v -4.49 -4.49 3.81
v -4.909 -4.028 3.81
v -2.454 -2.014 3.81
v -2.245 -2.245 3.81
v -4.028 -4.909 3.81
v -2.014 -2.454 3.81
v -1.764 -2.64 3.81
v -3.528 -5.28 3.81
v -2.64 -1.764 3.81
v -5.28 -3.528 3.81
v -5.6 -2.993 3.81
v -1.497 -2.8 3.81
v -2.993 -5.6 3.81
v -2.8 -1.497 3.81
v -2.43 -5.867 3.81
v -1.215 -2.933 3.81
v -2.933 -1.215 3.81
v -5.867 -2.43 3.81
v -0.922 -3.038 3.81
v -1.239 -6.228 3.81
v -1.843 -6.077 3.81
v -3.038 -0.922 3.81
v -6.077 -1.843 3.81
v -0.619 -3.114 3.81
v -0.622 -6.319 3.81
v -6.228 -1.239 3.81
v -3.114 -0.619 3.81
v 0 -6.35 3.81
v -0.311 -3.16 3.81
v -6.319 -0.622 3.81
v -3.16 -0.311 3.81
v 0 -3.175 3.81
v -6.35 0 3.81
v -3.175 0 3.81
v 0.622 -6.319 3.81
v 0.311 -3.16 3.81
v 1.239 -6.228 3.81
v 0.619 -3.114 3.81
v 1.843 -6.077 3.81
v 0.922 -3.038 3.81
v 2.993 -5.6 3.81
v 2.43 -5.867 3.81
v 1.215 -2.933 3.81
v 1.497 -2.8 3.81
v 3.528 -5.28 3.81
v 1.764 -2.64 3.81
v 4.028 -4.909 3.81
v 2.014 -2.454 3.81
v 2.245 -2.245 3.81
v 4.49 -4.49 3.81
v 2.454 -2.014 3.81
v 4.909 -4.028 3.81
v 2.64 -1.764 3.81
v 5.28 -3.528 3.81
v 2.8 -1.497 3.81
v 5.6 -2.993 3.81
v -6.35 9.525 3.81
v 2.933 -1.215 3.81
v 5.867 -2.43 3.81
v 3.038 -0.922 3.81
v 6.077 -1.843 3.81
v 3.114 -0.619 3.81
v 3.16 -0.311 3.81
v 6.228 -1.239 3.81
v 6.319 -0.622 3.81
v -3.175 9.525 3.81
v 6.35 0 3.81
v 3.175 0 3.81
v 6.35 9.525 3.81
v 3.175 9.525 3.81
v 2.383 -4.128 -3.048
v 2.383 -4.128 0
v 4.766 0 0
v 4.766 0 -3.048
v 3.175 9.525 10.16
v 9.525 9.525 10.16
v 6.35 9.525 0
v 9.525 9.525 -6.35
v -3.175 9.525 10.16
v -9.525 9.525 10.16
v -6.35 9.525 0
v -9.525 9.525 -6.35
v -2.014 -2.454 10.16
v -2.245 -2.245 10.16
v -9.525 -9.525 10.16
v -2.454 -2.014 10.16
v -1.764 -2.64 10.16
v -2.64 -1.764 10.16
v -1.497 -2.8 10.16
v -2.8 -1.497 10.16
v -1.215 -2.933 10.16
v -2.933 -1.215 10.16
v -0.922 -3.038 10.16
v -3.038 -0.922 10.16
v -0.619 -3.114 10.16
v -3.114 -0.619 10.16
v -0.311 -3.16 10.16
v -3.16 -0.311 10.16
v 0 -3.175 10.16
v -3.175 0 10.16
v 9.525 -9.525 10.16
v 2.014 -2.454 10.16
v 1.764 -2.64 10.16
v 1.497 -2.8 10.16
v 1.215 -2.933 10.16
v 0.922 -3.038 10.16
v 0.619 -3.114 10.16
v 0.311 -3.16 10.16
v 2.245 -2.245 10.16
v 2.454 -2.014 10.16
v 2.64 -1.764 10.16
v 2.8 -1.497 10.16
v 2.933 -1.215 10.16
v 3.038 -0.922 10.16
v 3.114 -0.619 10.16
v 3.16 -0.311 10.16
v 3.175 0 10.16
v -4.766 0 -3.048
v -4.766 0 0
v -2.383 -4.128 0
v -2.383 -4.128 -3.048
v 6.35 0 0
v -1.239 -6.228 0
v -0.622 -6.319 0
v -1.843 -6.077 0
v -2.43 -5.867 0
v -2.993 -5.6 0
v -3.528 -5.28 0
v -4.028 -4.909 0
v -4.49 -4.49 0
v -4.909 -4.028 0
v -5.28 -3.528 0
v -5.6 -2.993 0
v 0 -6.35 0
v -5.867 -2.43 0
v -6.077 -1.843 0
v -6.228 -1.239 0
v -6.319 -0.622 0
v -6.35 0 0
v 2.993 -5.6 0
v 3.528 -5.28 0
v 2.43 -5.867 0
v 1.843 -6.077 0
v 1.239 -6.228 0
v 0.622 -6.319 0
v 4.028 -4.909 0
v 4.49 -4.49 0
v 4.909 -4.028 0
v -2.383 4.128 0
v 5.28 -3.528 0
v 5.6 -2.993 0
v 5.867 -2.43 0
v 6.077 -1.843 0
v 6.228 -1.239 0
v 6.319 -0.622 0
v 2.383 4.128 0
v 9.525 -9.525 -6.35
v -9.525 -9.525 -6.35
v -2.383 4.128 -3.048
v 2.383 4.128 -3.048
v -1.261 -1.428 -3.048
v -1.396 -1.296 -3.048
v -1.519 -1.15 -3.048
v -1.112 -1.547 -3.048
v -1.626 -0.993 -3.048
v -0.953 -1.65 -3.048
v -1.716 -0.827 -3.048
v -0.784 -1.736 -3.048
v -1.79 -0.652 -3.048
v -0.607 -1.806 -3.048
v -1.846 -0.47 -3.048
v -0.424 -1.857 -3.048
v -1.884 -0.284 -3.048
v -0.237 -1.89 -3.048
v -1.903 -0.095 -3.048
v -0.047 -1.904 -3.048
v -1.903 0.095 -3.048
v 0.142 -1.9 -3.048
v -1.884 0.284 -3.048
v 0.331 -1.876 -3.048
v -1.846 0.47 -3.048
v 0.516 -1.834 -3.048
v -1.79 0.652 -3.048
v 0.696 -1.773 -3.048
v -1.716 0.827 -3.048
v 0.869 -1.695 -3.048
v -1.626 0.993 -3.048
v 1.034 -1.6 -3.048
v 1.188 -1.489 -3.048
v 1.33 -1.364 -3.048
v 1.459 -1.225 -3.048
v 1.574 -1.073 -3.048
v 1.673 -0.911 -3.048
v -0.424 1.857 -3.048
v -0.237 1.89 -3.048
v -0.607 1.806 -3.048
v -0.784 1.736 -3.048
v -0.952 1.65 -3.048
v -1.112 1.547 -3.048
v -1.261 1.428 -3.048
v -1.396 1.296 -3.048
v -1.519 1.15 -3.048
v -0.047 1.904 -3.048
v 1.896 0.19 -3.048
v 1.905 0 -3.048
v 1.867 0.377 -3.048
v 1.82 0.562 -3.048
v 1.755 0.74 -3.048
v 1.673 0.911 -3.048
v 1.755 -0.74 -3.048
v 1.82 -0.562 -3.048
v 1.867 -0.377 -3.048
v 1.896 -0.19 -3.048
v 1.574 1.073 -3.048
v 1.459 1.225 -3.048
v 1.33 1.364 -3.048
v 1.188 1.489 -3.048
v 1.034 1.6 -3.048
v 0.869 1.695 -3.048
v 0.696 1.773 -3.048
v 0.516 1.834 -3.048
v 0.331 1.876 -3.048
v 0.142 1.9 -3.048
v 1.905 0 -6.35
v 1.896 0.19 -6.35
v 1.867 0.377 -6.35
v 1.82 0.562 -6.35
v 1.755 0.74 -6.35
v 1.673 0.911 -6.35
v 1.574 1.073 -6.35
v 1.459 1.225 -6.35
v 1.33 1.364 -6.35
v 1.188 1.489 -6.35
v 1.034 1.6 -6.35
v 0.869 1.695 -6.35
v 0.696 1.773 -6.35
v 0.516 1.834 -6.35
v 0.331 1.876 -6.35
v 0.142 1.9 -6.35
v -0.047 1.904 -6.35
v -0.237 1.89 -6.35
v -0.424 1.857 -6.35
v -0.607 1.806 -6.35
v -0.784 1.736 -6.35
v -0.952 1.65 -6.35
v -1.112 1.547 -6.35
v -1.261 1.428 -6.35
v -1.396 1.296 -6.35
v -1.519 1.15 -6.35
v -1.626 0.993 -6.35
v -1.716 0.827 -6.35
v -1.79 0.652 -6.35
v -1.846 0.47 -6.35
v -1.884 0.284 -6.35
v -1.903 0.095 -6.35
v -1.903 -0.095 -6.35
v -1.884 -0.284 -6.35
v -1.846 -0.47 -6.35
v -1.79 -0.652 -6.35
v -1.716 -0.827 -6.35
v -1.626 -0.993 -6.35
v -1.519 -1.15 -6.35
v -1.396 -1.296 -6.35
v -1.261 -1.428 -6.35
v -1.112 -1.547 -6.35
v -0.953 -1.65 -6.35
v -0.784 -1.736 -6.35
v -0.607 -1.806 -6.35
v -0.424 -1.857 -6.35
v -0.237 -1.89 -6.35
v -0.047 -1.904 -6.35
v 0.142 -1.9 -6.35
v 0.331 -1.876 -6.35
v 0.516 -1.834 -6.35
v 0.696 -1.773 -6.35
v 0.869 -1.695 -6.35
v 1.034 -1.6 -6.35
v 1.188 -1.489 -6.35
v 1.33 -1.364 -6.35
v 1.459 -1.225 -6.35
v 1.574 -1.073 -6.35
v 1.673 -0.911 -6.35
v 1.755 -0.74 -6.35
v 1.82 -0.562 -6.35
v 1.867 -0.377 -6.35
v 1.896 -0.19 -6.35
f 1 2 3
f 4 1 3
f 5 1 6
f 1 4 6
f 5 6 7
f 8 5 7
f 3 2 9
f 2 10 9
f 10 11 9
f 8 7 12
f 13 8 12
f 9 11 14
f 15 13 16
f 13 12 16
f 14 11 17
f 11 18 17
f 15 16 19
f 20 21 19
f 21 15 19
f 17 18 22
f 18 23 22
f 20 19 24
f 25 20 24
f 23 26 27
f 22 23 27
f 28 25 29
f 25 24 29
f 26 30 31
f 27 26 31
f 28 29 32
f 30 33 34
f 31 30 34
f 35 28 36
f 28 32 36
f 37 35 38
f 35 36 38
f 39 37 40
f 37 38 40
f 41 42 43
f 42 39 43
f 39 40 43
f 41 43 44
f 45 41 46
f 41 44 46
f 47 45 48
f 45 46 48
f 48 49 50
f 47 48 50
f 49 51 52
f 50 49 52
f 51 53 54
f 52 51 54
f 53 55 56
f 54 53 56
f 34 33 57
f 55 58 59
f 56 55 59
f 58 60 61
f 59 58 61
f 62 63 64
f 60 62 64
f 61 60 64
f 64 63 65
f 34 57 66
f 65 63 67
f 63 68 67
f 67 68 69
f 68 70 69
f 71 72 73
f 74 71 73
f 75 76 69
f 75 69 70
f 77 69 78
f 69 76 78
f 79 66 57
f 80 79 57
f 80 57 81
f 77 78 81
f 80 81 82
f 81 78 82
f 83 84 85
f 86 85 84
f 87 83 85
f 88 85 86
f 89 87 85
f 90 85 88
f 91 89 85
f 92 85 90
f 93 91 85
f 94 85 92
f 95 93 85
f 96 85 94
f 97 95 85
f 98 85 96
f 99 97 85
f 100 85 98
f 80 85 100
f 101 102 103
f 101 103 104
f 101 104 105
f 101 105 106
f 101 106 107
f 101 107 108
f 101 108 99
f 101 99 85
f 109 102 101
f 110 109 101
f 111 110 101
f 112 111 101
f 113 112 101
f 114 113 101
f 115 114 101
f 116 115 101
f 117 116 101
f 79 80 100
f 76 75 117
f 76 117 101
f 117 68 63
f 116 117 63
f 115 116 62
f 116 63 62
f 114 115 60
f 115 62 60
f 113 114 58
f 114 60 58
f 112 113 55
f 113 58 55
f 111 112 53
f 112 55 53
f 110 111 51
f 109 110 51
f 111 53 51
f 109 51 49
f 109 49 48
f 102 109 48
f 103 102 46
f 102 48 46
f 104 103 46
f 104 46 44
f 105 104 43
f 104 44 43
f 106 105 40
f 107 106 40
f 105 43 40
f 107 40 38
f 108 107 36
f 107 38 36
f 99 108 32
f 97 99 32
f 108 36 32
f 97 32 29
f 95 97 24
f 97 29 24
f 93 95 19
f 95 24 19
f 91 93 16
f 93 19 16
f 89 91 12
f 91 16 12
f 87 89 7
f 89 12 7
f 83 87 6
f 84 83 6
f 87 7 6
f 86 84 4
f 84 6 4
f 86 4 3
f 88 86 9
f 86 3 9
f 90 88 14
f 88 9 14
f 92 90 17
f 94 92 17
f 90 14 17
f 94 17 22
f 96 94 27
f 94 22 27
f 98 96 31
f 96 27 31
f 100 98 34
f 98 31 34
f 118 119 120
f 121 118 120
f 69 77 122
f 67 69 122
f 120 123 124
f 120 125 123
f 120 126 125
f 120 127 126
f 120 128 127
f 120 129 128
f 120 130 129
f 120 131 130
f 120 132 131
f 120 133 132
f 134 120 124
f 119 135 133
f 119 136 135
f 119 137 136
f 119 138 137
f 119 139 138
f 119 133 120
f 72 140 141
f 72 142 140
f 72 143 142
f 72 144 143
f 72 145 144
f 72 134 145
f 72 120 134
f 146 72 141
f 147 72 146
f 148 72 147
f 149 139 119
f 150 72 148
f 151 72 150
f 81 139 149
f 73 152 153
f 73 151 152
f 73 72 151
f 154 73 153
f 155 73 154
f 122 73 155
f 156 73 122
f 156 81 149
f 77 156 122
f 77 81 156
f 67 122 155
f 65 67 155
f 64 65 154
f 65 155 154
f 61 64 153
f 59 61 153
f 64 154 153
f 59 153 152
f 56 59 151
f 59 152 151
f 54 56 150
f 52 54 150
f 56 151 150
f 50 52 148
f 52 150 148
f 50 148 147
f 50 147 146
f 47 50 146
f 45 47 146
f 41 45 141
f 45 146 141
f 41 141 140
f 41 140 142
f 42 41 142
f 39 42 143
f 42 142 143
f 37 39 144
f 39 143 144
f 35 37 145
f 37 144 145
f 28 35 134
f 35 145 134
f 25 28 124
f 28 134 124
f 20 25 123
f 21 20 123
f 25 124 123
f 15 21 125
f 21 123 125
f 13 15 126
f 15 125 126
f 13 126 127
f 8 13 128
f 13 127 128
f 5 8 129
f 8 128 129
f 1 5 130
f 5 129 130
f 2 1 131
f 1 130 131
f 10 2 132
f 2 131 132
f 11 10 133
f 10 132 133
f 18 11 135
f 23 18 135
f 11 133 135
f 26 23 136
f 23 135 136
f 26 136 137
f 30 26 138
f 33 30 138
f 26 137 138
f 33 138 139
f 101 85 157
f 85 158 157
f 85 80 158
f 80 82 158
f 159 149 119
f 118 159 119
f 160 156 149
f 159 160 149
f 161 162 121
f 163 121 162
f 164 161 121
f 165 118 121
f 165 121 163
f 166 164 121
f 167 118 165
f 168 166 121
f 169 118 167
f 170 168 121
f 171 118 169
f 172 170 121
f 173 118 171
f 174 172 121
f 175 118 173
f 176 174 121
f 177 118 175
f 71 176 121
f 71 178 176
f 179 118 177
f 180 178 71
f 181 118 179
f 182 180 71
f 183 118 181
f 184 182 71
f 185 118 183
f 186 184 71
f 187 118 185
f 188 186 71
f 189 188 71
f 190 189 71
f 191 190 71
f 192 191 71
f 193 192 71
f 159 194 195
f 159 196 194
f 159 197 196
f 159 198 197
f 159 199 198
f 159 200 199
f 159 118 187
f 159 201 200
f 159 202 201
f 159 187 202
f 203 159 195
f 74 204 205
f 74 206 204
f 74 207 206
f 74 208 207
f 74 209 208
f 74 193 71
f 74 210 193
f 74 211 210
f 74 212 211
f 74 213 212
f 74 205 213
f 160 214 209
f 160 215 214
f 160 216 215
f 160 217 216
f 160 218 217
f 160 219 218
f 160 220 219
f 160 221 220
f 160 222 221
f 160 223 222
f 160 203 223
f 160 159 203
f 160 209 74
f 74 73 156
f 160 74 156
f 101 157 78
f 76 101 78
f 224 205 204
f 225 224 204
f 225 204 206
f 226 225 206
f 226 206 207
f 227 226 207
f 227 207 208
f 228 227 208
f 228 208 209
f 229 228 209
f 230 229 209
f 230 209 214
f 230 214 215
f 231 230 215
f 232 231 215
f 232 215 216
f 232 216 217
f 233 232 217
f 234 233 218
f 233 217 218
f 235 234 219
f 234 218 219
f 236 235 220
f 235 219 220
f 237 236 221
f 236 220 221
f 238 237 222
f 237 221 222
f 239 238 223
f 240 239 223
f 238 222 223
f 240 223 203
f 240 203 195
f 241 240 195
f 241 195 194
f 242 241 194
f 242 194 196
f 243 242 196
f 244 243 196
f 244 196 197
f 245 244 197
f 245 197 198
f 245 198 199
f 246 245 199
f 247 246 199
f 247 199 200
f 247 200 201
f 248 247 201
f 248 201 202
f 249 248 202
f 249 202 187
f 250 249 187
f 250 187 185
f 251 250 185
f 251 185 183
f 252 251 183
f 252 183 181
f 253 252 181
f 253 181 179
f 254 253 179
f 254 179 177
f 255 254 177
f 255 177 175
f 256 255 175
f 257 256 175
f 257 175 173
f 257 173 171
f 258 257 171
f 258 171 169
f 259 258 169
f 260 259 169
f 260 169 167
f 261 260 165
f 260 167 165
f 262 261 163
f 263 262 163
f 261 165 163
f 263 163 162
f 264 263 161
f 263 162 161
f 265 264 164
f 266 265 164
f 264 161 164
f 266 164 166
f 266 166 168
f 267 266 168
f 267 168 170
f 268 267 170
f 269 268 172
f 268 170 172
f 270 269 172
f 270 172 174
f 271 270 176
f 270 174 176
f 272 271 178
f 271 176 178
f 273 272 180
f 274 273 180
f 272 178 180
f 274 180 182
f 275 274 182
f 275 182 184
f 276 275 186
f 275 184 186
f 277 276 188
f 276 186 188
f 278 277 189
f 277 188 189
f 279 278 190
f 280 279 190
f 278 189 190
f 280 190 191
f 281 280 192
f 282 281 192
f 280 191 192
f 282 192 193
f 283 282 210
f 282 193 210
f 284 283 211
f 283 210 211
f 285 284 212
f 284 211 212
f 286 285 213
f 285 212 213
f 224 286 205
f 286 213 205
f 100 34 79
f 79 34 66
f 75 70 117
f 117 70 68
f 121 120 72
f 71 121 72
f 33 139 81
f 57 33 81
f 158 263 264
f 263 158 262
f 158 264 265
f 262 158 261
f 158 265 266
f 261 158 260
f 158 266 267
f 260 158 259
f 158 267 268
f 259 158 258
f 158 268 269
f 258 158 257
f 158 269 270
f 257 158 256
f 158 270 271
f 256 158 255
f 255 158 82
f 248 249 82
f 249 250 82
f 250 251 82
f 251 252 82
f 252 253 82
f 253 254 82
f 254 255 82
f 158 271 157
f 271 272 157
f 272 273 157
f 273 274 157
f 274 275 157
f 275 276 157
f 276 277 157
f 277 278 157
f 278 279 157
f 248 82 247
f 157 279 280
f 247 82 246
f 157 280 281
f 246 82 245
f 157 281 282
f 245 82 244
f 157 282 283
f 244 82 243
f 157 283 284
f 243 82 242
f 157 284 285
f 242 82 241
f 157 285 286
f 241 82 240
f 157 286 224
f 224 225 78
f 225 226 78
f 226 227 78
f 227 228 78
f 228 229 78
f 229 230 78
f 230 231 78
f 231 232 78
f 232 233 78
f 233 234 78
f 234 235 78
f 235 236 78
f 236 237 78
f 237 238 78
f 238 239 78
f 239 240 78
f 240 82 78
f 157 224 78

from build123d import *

# Parameters (mm, degrees)
F0_W     = 19.05
F0_H     = 19.05
F1_DEPTH = 6.35
F3_DEPTH = 3.81
F5_DEPTH = 6.35
F7_DEPTH = 3.048
F8_R     = 1.905
F9_DEPTH = 3.303


with BuildPart() as f1:
    # F0 (on Top) → F1 (new body)
    with BuildSketch(Plane.XY):
        Rectangle(F0_W, F0_H)
    extrude(amount=-F1_DEPTH)

    # F2 (on face) → F3 (join)
    with BuildSketch(Plane.XY):
        with BuildLine():
            ThreePointArc((6.35, 0), (0, -6.35), (-6.35, 0))
            Line((-6.35, 0), (-6.35, 9.525))
            Line((-6.35, 9.525), (-9.525, 9.525))
            Line((-9.525, 9.525), (-9.525, -9.525))
            Line((-9.525, -9.525), (9.525, -9.525))
            Line((9.525, -9.525), (9.525, 9.525))
            Line((9.525, 9.525), (6.35, 9.525))
            Line((6.35, 9.525), (6.35, 0))
        make_face()
    extrude(amount=F3_DEPTH)

    # F4 (on face) → F5 (join)
    with BuildSketch(Plane.XY.offset(3.81)):
        with BuildLine():
            Line((-3.175, 9.525), (-9.525, 9.525))
            Line((-9.525, 9.525), (-9.525, -9.525))
            Line((-9.525, -9.525), (9.525, -9.525))
            Line((9.525, -9.525), (9.525, 9.525))
            Line((9.525, 9.525), (3.175, 9.525))
            Line((3.175, 9.525), (3.175, 0))
            ThreePointArc((3.175, 0), (0, -3.175), (-3.175, 0))
            Line((-3.175, 0), (-3.175, 9.525))
        make_face()
    extrude(amount=F5_DEPTH)

    # F6 (on face) → F7 (cut)
    with BuildSketch(Plane.XY):
        Polygon((2.383013, -4.1275), (4.766026, 0), (2.383013, 4.1275), (-2.383013, 4.1275), (-4.766026, 0), (-2.383013, -4.1275), align=None)
    extrude(amount=-F7_DEPTH, mode=Mode.SUBTRACT)

    # F8 (on face) → F9 (cut, through all)
    with BuildSketch(Plane.XY.offset(-3.048)):
        Circle(F8_R)
    extrude(amount=-F9_DEPTH, mode=Mode.SUBTRACT)


solid = f1.part
